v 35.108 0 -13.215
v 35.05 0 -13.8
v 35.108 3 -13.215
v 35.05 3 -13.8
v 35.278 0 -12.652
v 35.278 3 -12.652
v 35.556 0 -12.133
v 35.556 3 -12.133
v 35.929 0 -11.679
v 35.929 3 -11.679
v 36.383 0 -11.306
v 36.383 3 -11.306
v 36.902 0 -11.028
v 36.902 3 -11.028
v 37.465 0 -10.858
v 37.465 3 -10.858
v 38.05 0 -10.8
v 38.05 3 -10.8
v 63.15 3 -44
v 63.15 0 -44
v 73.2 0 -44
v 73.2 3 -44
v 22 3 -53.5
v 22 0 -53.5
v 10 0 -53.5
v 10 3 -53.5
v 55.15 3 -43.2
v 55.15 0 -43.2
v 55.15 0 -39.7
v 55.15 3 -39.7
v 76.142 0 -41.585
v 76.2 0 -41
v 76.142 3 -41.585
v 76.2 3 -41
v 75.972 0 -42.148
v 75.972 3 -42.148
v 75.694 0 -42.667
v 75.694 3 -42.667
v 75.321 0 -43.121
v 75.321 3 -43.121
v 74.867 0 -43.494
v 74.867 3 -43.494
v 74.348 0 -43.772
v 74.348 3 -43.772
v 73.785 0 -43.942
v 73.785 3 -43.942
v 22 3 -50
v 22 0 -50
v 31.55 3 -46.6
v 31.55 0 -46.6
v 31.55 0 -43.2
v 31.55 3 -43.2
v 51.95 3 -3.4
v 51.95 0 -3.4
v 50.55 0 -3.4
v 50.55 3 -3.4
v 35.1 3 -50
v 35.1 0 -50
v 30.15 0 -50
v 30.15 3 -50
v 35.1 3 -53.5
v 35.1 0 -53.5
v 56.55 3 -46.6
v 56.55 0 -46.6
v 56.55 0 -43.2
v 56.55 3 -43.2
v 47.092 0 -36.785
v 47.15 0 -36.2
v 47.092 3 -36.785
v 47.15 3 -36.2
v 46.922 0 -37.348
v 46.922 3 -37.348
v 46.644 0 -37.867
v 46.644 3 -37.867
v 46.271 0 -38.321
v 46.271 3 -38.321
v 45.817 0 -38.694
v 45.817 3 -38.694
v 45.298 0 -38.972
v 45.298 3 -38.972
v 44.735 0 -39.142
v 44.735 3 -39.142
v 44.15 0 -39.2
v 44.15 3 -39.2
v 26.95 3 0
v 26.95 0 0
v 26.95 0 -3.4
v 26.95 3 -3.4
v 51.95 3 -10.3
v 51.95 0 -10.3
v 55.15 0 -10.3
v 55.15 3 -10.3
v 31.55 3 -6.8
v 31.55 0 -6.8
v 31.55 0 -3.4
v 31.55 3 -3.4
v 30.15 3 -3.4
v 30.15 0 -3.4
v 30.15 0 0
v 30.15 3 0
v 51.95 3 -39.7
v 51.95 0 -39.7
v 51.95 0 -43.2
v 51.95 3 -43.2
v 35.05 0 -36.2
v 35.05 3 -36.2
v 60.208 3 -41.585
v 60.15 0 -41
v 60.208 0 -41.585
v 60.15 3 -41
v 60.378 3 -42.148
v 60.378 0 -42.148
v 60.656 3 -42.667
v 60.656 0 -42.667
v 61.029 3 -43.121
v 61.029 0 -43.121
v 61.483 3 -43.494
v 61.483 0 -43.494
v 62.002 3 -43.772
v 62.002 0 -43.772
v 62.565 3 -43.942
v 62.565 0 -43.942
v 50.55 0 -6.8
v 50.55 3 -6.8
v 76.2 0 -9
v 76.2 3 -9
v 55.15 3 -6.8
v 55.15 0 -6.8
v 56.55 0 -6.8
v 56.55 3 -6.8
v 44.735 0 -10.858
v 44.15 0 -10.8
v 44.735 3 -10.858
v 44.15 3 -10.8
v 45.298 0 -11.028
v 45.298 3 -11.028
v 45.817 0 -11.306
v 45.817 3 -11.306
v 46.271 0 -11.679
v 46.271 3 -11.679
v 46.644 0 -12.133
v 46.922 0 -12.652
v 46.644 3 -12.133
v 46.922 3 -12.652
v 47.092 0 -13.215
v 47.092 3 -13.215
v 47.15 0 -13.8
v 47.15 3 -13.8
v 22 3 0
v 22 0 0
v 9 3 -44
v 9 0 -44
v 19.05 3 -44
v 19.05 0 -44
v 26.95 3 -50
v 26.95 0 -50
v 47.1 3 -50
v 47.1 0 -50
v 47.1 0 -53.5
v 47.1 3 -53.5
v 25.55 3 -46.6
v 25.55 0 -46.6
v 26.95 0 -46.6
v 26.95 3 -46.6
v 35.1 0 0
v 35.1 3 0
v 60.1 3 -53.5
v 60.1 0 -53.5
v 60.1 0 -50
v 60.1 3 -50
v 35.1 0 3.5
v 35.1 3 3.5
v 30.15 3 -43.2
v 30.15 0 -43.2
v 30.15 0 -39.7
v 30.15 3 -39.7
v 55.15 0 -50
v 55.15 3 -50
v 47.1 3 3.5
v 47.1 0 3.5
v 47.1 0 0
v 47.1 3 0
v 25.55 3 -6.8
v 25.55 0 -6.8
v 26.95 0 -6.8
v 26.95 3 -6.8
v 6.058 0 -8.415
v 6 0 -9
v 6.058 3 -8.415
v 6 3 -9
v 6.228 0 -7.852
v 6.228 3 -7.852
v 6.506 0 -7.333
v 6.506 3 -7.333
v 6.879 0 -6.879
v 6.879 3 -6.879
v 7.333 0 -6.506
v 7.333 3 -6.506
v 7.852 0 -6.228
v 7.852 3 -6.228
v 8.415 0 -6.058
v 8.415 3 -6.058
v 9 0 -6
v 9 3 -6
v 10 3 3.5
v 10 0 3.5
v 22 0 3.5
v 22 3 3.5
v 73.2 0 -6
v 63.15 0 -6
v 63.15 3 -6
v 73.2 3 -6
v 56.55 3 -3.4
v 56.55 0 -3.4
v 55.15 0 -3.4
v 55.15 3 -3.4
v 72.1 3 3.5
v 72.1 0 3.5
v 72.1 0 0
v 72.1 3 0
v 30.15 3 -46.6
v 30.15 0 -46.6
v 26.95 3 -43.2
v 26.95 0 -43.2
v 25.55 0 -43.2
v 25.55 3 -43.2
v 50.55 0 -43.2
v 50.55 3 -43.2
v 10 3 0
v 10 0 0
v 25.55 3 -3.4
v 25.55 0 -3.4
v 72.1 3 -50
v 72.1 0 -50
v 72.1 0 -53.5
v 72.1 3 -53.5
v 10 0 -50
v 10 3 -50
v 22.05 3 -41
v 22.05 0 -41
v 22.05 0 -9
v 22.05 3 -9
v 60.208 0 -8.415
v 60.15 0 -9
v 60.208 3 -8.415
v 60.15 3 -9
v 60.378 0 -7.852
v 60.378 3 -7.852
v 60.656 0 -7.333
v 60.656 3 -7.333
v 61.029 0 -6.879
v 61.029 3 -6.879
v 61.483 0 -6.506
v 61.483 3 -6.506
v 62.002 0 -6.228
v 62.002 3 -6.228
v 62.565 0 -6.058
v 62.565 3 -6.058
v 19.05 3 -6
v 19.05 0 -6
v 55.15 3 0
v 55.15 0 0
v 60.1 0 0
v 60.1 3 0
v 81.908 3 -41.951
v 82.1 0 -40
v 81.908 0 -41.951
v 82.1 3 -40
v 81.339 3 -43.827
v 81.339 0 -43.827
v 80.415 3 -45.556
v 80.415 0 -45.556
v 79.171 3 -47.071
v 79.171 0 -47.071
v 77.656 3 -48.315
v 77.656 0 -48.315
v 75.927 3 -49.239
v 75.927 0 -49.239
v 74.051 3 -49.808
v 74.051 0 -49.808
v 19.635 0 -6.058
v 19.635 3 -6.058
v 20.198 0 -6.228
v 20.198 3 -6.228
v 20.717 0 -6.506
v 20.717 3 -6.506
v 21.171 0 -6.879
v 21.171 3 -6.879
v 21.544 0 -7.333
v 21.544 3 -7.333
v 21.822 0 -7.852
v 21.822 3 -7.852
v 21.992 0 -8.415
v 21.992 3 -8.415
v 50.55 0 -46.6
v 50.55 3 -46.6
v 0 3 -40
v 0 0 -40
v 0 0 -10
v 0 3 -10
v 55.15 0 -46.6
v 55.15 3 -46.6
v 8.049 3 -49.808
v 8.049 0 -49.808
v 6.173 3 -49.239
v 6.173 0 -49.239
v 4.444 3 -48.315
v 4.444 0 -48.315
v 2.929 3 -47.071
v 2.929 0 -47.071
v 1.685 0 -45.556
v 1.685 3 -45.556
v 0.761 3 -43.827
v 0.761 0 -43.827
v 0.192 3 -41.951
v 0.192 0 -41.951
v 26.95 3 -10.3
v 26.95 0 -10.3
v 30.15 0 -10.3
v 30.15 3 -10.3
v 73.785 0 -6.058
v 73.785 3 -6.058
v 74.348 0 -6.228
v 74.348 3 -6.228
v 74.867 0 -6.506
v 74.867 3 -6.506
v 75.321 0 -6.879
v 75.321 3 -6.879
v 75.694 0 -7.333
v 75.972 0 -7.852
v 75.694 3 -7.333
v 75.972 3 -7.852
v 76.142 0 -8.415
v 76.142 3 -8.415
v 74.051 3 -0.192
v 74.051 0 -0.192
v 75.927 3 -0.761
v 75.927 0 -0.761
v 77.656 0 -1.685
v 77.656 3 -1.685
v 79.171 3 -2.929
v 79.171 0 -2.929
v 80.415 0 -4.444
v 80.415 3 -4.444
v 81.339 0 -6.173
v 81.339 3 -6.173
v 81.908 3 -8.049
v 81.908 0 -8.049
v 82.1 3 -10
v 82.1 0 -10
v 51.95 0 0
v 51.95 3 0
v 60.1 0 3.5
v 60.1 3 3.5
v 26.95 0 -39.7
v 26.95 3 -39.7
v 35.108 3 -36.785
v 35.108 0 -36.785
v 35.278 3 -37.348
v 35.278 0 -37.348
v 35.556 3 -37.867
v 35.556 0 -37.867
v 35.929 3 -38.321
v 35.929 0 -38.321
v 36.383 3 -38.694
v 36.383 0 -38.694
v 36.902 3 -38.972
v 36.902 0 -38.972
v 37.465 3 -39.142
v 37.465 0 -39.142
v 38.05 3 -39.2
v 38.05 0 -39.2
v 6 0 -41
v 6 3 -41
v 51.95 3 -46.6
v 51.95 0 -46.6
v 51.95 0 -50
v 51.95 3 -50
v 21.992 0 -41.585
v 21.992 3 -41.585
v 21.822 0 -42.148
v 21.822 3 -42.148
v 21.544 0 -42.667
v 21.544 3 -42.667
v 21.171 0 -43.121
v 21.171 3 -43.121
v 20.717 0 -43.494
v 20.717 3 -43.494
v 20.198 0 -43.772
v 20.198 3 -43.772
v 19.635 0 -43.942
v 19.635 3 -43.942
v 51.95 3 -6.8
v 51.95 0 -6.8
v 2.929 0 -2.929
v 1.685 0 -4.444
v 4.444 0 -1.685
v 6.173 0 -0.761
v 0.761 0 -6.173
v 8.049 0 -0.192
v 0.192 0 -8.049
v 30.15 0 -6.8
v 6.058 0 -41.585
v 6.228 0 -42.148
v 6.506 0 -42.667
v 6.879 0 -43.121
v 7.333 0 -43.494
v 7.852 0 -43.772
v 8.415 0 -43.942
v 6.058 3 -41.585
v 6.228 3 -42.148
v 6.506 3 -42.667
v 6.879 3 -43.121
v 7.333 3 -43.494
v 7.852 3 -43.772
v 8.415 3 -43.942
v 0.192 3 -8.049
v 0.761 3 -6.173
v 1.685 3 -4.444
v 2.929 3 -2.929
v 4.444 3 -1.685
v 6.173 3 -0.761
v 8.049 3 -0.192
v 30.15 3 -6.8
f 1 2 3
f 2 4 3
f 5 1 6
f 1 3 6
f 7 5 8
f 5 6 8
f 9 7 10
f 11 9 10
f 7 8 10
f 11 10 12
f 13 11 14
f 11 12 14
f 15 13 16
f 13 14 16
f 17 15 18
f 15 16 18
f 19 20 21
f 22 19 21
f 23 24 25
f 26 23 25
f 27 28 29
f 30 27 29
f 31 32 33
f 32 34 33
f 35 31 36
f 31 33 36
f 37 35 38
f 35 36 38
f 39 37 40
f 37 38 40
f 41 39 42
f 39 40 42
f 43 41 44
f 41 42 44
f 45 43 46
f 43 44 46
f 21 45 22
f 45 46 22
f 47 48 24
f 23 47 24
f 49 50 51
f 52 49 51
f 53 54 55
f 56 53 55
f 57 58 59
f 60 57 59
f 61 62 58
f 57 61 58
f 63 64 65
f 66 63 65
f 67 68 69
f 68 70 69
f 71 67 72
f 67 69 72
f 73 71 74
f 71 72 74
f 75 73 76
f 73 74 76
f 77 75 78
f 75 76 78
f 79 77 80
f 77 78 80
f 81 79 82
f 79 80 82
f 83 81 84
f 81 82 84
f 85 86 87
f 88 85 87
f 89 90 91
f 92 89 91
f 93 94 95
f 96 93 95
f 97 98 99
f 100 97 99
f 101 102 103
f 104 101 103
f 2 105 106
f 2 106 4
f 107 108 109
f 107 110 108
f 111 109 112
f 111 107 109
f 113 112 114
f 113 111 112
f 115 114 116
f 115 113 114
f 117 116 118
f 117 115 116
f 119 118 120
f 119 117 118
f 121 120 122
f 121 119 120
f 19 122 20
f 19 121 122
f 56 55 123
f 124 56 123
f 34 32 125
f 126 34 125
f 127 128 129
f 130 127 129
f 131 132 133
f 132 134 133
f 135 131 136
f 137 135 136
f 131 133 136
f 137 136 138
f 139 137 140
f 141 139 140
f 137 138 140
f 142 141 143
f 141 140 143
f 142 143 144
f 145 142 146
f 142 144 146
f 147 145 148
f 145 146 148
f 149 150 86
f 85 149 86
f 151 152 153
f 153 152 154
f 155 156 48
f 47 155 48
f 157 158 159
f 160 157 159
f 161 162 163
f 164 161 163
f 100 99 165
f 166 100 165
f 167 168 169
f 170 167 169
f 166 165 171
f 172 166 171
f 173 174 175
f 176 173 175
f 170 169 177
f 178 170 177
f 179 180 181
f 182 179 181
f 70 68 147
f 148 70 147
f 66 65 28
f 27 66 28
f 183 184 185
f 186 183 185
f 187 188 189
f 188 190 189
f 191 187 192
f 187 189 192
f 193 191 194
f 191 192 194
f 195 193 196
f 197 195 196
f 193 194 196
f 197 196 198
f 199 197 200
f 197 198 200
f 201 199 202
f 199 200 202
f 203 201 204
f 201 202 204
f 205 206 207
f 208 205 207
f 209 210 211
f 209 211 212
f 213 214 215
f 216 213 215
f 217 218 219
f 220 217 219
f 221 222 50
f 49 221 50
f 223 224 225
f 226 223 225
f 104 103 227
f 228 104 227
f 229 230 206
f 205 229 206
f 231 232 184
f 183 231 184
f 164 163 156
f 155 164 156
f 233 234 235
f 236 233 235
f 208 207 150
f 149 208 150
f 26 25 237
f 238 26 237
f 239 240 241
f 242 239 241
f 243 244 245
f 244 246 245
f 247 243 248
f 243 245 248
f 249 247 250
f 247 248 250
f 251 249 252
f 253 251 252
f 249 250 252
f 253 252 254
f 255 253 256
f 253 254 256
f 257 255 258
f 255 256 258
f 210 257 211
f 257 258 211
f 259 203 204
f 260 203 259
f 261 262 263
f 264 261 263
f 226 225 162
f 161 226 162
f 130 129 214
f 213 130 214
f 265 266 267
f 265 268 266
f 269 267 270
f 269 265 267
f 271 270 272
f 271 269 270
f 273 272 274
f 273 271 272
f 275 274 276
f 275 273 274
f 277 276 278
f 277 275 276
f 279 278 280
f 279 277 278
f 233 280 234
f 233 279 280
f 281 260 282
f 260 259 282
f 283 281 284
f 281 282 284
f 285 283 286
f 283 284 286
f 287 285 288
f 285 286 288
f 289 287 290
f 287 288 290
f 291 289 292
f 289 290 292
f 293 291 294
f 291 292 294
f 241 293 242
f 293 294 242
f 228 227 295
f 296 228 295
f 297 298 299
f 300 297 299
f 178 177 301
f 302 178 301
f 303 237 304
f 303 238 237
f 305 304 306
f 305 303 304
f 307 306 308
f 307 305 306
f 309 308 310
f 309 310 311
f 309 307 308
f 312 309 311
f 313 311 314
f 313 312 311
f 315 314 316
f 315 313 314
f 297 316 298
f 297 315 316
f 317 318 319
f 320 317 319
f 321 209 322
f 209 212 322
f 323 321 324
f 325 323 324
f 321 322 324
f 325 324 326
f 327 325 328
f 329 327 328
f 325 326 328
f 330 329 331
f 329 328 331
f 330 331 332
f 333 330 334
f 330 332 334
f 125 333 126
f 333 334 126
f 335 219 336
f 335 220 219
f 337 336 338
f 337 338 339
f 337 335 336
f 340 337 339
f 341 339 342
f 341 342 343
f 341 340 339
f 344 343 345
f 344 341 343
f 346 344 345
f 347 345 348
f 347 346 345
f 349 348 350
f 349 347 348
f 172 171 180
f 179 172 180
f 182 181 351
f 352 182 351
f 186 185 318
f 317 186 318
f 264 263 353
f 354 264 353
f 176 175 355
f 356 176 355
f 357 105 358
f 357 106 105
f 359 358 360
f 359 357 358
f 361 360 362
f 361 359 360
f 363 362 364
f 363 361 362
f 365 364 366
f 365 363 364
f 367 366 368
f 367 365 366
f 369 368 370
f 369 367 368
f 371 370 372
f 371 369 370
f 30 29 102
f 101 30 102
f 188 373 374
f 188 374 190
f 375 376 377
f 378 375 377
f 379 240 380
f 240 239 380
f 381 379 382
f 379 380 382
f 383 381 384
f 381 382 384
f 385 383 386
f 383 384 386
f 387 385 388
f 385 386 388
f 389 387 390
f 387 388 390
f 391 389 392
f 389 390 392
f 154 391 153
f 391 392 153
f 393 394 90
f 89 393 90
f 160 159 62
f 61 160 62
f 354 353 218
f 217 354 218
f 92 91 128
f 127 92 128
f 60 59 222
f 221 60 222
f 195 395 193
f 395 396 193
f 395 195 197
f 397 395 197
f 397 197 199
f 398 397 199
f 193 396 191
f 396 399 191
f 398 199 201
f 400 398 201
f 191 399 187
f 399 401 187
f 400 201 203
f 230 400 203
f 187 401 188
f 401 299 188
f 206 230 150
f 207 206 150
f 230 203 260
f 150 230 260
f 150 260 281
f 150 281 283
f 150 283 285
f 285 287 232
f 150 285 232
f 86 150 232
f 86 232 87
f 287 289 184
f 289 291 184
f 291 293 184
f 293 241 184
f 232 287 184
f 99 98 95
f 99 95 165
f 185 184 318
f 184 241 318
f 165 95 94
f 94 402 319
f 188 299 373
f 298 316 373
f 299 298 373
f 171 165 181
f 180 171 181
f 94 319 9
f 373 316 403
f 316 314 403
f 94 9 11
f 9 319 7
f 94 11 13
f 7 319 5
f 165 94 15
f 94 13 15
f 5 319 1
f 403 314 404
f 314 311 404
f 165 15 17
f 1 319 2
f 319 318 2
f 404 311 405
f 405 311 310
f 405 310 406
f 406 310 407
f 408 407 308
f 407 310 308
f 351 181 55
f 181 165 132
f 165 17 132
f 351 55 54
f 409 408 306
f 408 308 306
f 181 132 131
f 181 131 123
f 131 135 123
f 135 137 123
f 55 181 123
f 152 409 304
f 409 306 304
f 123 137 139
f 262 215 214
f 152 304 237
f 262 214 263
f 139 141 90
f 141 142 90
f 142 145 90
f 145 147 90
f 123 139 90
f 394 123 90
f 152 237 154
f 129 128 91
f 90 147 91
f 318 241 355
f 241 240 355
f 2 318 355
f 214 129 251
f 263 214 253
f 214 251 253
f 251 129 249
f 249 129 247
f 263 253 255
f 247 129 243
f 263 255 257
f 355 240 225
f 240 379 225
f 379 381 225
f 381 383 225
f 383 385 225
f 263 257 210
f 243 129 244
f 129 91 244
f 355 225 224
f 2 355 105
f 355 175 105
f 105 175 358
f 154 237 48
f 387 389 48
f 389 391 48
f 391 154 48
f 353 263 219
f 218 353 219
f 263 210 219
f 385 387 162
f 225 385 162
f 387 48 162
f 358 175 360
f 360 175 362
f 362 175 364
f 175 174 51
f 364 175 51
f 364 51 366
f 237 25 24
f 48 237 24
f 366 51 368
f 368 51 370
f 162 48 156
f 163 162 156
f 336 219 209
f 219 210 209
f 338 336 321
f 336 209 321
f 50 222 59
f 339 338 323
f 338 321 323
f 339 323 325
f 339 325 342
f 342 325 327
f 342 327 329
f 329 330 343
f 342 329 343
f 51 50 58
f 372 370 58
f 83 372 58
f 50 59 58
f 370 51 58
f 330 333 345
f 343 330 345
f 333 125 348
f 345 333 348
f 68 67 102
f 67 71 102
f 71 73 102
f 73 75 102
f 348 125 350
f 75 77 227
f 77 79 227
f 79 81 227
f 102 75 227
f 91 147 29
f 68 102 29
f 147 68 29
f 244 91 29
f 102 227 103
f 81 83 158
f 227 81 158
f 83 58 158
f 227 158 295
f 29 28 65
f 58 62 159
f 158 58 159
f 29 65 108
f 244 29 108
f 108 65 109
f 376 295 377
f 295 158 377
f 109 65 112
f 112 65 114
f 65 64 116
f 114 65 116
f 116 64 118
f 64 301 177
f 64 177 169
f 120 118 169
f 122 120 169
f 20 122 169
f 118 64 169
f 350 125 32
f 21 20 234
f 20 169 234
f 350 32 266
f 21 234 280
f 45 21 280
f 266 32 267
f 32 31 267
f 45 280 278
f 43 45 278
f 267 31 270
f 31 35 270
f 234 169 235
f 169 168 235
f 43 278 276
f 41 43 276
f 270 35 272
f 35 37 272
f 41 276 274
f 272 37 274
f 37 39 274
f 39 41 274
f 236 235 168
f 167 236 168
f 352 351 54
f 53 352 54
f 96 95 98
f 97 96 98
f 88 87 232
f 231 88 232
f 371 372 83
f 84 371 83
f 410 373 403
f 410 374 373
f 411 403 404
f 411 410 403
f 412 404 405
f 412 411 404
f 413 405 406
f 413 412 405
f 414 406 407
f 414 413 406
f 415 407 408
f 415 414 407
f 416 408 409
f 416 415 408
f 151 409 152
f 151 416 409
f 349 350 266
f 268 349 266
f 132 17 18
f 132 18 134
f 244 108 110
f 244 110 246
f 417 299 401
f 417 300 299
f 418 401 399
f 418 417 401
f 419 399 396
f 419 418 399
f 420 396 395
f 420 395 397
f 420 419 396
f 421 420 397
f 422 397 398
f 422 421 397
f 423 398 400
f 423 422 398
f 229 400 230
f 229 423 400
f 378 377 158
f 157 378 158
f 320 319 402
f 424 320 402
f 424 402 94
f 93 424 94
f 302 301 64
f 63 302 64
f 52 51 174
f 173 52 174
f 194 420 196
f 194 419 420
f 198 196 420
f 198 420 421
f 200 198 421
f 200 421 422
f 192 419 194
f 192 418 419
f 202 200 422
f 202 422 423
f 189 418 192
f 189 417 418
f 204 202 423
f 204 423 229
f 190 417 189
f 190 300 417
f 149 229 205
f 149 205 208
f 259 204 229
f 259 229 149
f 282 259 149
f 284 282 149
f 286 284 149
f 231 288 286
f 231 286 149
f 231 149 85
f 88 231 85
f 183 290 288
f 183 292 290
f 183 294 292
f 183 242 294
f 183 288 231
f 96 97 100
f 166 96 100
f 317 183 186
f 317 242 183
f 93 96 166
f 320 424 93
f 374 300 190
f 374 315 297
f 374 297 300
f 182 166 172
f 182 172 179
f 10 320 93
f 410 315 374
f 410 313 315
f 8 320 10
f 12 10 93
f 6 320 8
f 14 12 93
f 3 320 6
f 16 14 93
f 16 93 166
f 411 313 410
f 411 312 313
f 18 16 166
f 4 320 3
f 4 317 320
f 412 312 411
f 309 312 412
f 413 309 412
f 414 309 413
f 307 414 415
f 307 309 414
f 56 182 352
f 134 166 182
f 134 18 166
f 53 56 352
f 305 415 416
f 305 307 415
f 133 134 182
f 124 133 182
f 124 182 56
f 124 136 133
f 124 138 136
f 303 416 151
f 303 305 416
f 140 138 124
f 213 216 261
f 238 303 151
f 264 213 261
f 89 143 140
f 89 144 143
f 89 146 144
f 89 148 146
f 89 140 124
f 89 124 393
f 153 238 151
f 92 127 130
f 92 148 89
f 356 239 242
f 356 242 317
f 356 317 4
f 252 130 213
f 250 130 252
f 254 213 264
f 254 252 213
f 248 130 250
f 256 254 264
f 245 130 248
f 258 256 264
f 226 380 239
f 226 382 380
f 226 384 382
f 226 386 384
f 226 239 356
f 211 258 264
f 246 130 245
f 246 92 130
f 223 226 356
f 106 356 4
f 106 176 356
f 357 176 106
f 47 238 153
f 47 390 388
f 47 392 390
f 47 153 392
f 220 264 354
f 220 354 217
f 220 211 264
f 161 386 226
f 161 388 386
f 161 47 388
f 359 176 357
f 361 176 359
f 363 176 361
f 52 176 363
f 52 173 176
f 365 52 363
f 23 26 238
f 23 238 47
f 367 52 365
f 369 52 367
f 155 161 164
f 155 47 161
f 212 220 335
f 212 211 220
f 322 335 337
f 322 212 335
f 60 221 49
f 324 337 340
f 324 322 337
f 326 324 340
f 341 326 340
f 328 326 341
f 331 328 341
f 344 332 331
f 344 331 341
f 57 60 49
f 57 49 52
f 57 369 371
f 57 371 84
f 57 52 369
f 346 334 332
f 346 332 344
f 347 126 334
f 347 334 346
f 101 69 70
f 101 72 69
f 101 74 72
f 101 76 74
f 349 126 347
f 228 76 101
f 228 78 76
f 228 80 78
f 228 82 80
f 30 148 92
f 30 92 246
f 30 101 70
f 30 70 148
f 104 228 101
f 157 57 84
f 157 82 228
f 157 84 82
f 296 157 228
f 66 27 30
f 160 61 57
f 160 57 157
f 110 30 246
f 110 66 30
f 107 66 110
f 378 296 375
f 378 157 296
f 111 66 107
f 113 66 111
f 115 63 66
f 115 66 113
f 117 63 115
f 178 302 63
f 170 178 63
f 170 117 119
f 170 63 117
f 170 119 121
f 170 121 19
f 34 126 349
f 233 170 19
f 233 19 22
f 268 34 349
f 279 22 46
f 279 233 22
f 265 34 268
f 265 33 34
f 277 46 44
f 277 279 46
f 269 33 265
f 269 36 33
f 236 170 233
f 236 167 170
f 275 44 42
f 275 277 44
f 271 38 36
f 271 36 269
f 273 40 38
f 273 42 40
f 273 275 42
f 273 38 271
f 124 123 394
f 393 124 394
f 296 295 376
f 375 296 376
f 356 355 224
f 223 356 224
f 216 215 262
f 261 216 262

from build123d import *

# Parameters (mm, degrees)
EXTRUDE_1_DEPTH     = 3
FILLET_1_R          = 10
SKETCH_2_W          = 12.1
SKETCH_2_H          = 28.4
SKETCH_2_W_2        = 16.05
SKETCH_2_H_2        = 38
CUT_EXTRUDE_1_DEPTH = 99.039073843
FILLET_2_R          = 3


with BuildPart() as part:
    # 草图1 → 凸台-拉伸1 (new body)
    with BuildSketch(Plane(origin=(0, 0, 0), x_dir=(1, 0, 0), z_dir=(0, 1, 0))):
        Polygon((10, 0), (10, -3.5), (22, -3.5), (22, 0), (26.95, 0), (26.95, 3.4), (25.55, 3.4), (25.55, 6.8), (26.95, 6.8), (26.95, 10.3), (30.15, 10.3), (30.15, 6.8), (31.55, 6.8), (31.55, 3.4), (30.15, 3.4), (30.15, 0), (35.1, 0), (35.1, -3.5), (47.1, -3.5), (47.1, 0), (51.95, 0), (51.95, 3.4), (50.55, 3.4), (50.55, 6.8), (51.95, 6.8), (51.95, 10.3), (55.15, 10.3), (55.15, 6.8), (56.55, 6.8), (56.55, 3.4), (55.15, 3.4), (55.15, 0), (60.1, 0), (60.1, -3.5), (72.1, -3.5), (72.1, 0), (82.1, 0), (82.1, 50), (72.1, 50), (72.1, 53.5), (60.1, 53.5), (60.1, 50), (55.15, 50), (55.15, 46.6), (56.55, 46.6), (56.55, 43.2), (55.15, 43.2), (55.15, 39.7), (51.95, 39.7), (51.95, 43.2), (50.55, 43.2), (50.55, 46.6), (51.95, 46.6), (51.95, 50), (47.1, 50), (47.1, 53.5), (35.1, 53.5), (35.1, 50), (30.15, 50), (30.15, 46.6), (31.55, 46.6), (31.55, 43.2), (30.15, 43.2), (30.15, 39.7), (26.95, 39.7), (26.95, 43.2), (25.55, 43.2), (25.55, 46.6), (26.95, 46.6), (26.95, 50), (22, 50), (22, 53.5), (10, 53.5), (10, 50), (0, 50), (0, 0), align=None)
    extrude(amount=EXTRUDE_1_DEPTH)

    # 圆角1
    fillet_1_edges = [part.edges().sort_by_distance(p)[0] for p in [
        (0, 1.5, -50),
        (82.1, 1.5, -50),
        (82.1, 1.5, 0),
        (0, 1.5, 0),
    ]]
    fillet(fillet_1_edges, radius=FILLET_1_R - 0.0001)  # a hair under: the kernel refuses the full size

    # 草图2 → 切除-拉伸1 (cut, through all)
    with BuildSketch(Plane.XZ):
        with Locations((41.1, -25)):
            Rectangle(SKETCH_2_W, SKETCH_2_H)
        with Locations((14.025, -25)):
            Rectangle(SKETCH_2_W_2, SKETCH_2_H_2)
        with Locations((68.175, -25)):
            Rectangle(SKETCH_2_W_2, SKETCH_2_H_2)
    extrude(amount=-CUT_EXTRUDE_1_DEPTH, mode=Mode.SUBTRACT)

    # 圆角2
    fillet_2_edges = [part.edges().sort_by_distance(p)[0] for p in [
        (60.15, 1.5, -6),
        (76.2, 1.5, -6),
        (76.2, 1.5, -44),
        (60.15, 1.5, -44),
        (6, 1.5, -44),
        (6, 1.5, -6),
        (22.05, 1.5, -6),
        (22.05, 1.5, -44),
        (35.05, 1.5, -39.2),
        (35.05, 1.5, -10.8),
        (47.15, 1.5, -10.8),
        (47.15, 1.5, -39.2),
    ]]
    fillet(fillet_2_edges, radius=FILLET_2_R)


solid = part.part
